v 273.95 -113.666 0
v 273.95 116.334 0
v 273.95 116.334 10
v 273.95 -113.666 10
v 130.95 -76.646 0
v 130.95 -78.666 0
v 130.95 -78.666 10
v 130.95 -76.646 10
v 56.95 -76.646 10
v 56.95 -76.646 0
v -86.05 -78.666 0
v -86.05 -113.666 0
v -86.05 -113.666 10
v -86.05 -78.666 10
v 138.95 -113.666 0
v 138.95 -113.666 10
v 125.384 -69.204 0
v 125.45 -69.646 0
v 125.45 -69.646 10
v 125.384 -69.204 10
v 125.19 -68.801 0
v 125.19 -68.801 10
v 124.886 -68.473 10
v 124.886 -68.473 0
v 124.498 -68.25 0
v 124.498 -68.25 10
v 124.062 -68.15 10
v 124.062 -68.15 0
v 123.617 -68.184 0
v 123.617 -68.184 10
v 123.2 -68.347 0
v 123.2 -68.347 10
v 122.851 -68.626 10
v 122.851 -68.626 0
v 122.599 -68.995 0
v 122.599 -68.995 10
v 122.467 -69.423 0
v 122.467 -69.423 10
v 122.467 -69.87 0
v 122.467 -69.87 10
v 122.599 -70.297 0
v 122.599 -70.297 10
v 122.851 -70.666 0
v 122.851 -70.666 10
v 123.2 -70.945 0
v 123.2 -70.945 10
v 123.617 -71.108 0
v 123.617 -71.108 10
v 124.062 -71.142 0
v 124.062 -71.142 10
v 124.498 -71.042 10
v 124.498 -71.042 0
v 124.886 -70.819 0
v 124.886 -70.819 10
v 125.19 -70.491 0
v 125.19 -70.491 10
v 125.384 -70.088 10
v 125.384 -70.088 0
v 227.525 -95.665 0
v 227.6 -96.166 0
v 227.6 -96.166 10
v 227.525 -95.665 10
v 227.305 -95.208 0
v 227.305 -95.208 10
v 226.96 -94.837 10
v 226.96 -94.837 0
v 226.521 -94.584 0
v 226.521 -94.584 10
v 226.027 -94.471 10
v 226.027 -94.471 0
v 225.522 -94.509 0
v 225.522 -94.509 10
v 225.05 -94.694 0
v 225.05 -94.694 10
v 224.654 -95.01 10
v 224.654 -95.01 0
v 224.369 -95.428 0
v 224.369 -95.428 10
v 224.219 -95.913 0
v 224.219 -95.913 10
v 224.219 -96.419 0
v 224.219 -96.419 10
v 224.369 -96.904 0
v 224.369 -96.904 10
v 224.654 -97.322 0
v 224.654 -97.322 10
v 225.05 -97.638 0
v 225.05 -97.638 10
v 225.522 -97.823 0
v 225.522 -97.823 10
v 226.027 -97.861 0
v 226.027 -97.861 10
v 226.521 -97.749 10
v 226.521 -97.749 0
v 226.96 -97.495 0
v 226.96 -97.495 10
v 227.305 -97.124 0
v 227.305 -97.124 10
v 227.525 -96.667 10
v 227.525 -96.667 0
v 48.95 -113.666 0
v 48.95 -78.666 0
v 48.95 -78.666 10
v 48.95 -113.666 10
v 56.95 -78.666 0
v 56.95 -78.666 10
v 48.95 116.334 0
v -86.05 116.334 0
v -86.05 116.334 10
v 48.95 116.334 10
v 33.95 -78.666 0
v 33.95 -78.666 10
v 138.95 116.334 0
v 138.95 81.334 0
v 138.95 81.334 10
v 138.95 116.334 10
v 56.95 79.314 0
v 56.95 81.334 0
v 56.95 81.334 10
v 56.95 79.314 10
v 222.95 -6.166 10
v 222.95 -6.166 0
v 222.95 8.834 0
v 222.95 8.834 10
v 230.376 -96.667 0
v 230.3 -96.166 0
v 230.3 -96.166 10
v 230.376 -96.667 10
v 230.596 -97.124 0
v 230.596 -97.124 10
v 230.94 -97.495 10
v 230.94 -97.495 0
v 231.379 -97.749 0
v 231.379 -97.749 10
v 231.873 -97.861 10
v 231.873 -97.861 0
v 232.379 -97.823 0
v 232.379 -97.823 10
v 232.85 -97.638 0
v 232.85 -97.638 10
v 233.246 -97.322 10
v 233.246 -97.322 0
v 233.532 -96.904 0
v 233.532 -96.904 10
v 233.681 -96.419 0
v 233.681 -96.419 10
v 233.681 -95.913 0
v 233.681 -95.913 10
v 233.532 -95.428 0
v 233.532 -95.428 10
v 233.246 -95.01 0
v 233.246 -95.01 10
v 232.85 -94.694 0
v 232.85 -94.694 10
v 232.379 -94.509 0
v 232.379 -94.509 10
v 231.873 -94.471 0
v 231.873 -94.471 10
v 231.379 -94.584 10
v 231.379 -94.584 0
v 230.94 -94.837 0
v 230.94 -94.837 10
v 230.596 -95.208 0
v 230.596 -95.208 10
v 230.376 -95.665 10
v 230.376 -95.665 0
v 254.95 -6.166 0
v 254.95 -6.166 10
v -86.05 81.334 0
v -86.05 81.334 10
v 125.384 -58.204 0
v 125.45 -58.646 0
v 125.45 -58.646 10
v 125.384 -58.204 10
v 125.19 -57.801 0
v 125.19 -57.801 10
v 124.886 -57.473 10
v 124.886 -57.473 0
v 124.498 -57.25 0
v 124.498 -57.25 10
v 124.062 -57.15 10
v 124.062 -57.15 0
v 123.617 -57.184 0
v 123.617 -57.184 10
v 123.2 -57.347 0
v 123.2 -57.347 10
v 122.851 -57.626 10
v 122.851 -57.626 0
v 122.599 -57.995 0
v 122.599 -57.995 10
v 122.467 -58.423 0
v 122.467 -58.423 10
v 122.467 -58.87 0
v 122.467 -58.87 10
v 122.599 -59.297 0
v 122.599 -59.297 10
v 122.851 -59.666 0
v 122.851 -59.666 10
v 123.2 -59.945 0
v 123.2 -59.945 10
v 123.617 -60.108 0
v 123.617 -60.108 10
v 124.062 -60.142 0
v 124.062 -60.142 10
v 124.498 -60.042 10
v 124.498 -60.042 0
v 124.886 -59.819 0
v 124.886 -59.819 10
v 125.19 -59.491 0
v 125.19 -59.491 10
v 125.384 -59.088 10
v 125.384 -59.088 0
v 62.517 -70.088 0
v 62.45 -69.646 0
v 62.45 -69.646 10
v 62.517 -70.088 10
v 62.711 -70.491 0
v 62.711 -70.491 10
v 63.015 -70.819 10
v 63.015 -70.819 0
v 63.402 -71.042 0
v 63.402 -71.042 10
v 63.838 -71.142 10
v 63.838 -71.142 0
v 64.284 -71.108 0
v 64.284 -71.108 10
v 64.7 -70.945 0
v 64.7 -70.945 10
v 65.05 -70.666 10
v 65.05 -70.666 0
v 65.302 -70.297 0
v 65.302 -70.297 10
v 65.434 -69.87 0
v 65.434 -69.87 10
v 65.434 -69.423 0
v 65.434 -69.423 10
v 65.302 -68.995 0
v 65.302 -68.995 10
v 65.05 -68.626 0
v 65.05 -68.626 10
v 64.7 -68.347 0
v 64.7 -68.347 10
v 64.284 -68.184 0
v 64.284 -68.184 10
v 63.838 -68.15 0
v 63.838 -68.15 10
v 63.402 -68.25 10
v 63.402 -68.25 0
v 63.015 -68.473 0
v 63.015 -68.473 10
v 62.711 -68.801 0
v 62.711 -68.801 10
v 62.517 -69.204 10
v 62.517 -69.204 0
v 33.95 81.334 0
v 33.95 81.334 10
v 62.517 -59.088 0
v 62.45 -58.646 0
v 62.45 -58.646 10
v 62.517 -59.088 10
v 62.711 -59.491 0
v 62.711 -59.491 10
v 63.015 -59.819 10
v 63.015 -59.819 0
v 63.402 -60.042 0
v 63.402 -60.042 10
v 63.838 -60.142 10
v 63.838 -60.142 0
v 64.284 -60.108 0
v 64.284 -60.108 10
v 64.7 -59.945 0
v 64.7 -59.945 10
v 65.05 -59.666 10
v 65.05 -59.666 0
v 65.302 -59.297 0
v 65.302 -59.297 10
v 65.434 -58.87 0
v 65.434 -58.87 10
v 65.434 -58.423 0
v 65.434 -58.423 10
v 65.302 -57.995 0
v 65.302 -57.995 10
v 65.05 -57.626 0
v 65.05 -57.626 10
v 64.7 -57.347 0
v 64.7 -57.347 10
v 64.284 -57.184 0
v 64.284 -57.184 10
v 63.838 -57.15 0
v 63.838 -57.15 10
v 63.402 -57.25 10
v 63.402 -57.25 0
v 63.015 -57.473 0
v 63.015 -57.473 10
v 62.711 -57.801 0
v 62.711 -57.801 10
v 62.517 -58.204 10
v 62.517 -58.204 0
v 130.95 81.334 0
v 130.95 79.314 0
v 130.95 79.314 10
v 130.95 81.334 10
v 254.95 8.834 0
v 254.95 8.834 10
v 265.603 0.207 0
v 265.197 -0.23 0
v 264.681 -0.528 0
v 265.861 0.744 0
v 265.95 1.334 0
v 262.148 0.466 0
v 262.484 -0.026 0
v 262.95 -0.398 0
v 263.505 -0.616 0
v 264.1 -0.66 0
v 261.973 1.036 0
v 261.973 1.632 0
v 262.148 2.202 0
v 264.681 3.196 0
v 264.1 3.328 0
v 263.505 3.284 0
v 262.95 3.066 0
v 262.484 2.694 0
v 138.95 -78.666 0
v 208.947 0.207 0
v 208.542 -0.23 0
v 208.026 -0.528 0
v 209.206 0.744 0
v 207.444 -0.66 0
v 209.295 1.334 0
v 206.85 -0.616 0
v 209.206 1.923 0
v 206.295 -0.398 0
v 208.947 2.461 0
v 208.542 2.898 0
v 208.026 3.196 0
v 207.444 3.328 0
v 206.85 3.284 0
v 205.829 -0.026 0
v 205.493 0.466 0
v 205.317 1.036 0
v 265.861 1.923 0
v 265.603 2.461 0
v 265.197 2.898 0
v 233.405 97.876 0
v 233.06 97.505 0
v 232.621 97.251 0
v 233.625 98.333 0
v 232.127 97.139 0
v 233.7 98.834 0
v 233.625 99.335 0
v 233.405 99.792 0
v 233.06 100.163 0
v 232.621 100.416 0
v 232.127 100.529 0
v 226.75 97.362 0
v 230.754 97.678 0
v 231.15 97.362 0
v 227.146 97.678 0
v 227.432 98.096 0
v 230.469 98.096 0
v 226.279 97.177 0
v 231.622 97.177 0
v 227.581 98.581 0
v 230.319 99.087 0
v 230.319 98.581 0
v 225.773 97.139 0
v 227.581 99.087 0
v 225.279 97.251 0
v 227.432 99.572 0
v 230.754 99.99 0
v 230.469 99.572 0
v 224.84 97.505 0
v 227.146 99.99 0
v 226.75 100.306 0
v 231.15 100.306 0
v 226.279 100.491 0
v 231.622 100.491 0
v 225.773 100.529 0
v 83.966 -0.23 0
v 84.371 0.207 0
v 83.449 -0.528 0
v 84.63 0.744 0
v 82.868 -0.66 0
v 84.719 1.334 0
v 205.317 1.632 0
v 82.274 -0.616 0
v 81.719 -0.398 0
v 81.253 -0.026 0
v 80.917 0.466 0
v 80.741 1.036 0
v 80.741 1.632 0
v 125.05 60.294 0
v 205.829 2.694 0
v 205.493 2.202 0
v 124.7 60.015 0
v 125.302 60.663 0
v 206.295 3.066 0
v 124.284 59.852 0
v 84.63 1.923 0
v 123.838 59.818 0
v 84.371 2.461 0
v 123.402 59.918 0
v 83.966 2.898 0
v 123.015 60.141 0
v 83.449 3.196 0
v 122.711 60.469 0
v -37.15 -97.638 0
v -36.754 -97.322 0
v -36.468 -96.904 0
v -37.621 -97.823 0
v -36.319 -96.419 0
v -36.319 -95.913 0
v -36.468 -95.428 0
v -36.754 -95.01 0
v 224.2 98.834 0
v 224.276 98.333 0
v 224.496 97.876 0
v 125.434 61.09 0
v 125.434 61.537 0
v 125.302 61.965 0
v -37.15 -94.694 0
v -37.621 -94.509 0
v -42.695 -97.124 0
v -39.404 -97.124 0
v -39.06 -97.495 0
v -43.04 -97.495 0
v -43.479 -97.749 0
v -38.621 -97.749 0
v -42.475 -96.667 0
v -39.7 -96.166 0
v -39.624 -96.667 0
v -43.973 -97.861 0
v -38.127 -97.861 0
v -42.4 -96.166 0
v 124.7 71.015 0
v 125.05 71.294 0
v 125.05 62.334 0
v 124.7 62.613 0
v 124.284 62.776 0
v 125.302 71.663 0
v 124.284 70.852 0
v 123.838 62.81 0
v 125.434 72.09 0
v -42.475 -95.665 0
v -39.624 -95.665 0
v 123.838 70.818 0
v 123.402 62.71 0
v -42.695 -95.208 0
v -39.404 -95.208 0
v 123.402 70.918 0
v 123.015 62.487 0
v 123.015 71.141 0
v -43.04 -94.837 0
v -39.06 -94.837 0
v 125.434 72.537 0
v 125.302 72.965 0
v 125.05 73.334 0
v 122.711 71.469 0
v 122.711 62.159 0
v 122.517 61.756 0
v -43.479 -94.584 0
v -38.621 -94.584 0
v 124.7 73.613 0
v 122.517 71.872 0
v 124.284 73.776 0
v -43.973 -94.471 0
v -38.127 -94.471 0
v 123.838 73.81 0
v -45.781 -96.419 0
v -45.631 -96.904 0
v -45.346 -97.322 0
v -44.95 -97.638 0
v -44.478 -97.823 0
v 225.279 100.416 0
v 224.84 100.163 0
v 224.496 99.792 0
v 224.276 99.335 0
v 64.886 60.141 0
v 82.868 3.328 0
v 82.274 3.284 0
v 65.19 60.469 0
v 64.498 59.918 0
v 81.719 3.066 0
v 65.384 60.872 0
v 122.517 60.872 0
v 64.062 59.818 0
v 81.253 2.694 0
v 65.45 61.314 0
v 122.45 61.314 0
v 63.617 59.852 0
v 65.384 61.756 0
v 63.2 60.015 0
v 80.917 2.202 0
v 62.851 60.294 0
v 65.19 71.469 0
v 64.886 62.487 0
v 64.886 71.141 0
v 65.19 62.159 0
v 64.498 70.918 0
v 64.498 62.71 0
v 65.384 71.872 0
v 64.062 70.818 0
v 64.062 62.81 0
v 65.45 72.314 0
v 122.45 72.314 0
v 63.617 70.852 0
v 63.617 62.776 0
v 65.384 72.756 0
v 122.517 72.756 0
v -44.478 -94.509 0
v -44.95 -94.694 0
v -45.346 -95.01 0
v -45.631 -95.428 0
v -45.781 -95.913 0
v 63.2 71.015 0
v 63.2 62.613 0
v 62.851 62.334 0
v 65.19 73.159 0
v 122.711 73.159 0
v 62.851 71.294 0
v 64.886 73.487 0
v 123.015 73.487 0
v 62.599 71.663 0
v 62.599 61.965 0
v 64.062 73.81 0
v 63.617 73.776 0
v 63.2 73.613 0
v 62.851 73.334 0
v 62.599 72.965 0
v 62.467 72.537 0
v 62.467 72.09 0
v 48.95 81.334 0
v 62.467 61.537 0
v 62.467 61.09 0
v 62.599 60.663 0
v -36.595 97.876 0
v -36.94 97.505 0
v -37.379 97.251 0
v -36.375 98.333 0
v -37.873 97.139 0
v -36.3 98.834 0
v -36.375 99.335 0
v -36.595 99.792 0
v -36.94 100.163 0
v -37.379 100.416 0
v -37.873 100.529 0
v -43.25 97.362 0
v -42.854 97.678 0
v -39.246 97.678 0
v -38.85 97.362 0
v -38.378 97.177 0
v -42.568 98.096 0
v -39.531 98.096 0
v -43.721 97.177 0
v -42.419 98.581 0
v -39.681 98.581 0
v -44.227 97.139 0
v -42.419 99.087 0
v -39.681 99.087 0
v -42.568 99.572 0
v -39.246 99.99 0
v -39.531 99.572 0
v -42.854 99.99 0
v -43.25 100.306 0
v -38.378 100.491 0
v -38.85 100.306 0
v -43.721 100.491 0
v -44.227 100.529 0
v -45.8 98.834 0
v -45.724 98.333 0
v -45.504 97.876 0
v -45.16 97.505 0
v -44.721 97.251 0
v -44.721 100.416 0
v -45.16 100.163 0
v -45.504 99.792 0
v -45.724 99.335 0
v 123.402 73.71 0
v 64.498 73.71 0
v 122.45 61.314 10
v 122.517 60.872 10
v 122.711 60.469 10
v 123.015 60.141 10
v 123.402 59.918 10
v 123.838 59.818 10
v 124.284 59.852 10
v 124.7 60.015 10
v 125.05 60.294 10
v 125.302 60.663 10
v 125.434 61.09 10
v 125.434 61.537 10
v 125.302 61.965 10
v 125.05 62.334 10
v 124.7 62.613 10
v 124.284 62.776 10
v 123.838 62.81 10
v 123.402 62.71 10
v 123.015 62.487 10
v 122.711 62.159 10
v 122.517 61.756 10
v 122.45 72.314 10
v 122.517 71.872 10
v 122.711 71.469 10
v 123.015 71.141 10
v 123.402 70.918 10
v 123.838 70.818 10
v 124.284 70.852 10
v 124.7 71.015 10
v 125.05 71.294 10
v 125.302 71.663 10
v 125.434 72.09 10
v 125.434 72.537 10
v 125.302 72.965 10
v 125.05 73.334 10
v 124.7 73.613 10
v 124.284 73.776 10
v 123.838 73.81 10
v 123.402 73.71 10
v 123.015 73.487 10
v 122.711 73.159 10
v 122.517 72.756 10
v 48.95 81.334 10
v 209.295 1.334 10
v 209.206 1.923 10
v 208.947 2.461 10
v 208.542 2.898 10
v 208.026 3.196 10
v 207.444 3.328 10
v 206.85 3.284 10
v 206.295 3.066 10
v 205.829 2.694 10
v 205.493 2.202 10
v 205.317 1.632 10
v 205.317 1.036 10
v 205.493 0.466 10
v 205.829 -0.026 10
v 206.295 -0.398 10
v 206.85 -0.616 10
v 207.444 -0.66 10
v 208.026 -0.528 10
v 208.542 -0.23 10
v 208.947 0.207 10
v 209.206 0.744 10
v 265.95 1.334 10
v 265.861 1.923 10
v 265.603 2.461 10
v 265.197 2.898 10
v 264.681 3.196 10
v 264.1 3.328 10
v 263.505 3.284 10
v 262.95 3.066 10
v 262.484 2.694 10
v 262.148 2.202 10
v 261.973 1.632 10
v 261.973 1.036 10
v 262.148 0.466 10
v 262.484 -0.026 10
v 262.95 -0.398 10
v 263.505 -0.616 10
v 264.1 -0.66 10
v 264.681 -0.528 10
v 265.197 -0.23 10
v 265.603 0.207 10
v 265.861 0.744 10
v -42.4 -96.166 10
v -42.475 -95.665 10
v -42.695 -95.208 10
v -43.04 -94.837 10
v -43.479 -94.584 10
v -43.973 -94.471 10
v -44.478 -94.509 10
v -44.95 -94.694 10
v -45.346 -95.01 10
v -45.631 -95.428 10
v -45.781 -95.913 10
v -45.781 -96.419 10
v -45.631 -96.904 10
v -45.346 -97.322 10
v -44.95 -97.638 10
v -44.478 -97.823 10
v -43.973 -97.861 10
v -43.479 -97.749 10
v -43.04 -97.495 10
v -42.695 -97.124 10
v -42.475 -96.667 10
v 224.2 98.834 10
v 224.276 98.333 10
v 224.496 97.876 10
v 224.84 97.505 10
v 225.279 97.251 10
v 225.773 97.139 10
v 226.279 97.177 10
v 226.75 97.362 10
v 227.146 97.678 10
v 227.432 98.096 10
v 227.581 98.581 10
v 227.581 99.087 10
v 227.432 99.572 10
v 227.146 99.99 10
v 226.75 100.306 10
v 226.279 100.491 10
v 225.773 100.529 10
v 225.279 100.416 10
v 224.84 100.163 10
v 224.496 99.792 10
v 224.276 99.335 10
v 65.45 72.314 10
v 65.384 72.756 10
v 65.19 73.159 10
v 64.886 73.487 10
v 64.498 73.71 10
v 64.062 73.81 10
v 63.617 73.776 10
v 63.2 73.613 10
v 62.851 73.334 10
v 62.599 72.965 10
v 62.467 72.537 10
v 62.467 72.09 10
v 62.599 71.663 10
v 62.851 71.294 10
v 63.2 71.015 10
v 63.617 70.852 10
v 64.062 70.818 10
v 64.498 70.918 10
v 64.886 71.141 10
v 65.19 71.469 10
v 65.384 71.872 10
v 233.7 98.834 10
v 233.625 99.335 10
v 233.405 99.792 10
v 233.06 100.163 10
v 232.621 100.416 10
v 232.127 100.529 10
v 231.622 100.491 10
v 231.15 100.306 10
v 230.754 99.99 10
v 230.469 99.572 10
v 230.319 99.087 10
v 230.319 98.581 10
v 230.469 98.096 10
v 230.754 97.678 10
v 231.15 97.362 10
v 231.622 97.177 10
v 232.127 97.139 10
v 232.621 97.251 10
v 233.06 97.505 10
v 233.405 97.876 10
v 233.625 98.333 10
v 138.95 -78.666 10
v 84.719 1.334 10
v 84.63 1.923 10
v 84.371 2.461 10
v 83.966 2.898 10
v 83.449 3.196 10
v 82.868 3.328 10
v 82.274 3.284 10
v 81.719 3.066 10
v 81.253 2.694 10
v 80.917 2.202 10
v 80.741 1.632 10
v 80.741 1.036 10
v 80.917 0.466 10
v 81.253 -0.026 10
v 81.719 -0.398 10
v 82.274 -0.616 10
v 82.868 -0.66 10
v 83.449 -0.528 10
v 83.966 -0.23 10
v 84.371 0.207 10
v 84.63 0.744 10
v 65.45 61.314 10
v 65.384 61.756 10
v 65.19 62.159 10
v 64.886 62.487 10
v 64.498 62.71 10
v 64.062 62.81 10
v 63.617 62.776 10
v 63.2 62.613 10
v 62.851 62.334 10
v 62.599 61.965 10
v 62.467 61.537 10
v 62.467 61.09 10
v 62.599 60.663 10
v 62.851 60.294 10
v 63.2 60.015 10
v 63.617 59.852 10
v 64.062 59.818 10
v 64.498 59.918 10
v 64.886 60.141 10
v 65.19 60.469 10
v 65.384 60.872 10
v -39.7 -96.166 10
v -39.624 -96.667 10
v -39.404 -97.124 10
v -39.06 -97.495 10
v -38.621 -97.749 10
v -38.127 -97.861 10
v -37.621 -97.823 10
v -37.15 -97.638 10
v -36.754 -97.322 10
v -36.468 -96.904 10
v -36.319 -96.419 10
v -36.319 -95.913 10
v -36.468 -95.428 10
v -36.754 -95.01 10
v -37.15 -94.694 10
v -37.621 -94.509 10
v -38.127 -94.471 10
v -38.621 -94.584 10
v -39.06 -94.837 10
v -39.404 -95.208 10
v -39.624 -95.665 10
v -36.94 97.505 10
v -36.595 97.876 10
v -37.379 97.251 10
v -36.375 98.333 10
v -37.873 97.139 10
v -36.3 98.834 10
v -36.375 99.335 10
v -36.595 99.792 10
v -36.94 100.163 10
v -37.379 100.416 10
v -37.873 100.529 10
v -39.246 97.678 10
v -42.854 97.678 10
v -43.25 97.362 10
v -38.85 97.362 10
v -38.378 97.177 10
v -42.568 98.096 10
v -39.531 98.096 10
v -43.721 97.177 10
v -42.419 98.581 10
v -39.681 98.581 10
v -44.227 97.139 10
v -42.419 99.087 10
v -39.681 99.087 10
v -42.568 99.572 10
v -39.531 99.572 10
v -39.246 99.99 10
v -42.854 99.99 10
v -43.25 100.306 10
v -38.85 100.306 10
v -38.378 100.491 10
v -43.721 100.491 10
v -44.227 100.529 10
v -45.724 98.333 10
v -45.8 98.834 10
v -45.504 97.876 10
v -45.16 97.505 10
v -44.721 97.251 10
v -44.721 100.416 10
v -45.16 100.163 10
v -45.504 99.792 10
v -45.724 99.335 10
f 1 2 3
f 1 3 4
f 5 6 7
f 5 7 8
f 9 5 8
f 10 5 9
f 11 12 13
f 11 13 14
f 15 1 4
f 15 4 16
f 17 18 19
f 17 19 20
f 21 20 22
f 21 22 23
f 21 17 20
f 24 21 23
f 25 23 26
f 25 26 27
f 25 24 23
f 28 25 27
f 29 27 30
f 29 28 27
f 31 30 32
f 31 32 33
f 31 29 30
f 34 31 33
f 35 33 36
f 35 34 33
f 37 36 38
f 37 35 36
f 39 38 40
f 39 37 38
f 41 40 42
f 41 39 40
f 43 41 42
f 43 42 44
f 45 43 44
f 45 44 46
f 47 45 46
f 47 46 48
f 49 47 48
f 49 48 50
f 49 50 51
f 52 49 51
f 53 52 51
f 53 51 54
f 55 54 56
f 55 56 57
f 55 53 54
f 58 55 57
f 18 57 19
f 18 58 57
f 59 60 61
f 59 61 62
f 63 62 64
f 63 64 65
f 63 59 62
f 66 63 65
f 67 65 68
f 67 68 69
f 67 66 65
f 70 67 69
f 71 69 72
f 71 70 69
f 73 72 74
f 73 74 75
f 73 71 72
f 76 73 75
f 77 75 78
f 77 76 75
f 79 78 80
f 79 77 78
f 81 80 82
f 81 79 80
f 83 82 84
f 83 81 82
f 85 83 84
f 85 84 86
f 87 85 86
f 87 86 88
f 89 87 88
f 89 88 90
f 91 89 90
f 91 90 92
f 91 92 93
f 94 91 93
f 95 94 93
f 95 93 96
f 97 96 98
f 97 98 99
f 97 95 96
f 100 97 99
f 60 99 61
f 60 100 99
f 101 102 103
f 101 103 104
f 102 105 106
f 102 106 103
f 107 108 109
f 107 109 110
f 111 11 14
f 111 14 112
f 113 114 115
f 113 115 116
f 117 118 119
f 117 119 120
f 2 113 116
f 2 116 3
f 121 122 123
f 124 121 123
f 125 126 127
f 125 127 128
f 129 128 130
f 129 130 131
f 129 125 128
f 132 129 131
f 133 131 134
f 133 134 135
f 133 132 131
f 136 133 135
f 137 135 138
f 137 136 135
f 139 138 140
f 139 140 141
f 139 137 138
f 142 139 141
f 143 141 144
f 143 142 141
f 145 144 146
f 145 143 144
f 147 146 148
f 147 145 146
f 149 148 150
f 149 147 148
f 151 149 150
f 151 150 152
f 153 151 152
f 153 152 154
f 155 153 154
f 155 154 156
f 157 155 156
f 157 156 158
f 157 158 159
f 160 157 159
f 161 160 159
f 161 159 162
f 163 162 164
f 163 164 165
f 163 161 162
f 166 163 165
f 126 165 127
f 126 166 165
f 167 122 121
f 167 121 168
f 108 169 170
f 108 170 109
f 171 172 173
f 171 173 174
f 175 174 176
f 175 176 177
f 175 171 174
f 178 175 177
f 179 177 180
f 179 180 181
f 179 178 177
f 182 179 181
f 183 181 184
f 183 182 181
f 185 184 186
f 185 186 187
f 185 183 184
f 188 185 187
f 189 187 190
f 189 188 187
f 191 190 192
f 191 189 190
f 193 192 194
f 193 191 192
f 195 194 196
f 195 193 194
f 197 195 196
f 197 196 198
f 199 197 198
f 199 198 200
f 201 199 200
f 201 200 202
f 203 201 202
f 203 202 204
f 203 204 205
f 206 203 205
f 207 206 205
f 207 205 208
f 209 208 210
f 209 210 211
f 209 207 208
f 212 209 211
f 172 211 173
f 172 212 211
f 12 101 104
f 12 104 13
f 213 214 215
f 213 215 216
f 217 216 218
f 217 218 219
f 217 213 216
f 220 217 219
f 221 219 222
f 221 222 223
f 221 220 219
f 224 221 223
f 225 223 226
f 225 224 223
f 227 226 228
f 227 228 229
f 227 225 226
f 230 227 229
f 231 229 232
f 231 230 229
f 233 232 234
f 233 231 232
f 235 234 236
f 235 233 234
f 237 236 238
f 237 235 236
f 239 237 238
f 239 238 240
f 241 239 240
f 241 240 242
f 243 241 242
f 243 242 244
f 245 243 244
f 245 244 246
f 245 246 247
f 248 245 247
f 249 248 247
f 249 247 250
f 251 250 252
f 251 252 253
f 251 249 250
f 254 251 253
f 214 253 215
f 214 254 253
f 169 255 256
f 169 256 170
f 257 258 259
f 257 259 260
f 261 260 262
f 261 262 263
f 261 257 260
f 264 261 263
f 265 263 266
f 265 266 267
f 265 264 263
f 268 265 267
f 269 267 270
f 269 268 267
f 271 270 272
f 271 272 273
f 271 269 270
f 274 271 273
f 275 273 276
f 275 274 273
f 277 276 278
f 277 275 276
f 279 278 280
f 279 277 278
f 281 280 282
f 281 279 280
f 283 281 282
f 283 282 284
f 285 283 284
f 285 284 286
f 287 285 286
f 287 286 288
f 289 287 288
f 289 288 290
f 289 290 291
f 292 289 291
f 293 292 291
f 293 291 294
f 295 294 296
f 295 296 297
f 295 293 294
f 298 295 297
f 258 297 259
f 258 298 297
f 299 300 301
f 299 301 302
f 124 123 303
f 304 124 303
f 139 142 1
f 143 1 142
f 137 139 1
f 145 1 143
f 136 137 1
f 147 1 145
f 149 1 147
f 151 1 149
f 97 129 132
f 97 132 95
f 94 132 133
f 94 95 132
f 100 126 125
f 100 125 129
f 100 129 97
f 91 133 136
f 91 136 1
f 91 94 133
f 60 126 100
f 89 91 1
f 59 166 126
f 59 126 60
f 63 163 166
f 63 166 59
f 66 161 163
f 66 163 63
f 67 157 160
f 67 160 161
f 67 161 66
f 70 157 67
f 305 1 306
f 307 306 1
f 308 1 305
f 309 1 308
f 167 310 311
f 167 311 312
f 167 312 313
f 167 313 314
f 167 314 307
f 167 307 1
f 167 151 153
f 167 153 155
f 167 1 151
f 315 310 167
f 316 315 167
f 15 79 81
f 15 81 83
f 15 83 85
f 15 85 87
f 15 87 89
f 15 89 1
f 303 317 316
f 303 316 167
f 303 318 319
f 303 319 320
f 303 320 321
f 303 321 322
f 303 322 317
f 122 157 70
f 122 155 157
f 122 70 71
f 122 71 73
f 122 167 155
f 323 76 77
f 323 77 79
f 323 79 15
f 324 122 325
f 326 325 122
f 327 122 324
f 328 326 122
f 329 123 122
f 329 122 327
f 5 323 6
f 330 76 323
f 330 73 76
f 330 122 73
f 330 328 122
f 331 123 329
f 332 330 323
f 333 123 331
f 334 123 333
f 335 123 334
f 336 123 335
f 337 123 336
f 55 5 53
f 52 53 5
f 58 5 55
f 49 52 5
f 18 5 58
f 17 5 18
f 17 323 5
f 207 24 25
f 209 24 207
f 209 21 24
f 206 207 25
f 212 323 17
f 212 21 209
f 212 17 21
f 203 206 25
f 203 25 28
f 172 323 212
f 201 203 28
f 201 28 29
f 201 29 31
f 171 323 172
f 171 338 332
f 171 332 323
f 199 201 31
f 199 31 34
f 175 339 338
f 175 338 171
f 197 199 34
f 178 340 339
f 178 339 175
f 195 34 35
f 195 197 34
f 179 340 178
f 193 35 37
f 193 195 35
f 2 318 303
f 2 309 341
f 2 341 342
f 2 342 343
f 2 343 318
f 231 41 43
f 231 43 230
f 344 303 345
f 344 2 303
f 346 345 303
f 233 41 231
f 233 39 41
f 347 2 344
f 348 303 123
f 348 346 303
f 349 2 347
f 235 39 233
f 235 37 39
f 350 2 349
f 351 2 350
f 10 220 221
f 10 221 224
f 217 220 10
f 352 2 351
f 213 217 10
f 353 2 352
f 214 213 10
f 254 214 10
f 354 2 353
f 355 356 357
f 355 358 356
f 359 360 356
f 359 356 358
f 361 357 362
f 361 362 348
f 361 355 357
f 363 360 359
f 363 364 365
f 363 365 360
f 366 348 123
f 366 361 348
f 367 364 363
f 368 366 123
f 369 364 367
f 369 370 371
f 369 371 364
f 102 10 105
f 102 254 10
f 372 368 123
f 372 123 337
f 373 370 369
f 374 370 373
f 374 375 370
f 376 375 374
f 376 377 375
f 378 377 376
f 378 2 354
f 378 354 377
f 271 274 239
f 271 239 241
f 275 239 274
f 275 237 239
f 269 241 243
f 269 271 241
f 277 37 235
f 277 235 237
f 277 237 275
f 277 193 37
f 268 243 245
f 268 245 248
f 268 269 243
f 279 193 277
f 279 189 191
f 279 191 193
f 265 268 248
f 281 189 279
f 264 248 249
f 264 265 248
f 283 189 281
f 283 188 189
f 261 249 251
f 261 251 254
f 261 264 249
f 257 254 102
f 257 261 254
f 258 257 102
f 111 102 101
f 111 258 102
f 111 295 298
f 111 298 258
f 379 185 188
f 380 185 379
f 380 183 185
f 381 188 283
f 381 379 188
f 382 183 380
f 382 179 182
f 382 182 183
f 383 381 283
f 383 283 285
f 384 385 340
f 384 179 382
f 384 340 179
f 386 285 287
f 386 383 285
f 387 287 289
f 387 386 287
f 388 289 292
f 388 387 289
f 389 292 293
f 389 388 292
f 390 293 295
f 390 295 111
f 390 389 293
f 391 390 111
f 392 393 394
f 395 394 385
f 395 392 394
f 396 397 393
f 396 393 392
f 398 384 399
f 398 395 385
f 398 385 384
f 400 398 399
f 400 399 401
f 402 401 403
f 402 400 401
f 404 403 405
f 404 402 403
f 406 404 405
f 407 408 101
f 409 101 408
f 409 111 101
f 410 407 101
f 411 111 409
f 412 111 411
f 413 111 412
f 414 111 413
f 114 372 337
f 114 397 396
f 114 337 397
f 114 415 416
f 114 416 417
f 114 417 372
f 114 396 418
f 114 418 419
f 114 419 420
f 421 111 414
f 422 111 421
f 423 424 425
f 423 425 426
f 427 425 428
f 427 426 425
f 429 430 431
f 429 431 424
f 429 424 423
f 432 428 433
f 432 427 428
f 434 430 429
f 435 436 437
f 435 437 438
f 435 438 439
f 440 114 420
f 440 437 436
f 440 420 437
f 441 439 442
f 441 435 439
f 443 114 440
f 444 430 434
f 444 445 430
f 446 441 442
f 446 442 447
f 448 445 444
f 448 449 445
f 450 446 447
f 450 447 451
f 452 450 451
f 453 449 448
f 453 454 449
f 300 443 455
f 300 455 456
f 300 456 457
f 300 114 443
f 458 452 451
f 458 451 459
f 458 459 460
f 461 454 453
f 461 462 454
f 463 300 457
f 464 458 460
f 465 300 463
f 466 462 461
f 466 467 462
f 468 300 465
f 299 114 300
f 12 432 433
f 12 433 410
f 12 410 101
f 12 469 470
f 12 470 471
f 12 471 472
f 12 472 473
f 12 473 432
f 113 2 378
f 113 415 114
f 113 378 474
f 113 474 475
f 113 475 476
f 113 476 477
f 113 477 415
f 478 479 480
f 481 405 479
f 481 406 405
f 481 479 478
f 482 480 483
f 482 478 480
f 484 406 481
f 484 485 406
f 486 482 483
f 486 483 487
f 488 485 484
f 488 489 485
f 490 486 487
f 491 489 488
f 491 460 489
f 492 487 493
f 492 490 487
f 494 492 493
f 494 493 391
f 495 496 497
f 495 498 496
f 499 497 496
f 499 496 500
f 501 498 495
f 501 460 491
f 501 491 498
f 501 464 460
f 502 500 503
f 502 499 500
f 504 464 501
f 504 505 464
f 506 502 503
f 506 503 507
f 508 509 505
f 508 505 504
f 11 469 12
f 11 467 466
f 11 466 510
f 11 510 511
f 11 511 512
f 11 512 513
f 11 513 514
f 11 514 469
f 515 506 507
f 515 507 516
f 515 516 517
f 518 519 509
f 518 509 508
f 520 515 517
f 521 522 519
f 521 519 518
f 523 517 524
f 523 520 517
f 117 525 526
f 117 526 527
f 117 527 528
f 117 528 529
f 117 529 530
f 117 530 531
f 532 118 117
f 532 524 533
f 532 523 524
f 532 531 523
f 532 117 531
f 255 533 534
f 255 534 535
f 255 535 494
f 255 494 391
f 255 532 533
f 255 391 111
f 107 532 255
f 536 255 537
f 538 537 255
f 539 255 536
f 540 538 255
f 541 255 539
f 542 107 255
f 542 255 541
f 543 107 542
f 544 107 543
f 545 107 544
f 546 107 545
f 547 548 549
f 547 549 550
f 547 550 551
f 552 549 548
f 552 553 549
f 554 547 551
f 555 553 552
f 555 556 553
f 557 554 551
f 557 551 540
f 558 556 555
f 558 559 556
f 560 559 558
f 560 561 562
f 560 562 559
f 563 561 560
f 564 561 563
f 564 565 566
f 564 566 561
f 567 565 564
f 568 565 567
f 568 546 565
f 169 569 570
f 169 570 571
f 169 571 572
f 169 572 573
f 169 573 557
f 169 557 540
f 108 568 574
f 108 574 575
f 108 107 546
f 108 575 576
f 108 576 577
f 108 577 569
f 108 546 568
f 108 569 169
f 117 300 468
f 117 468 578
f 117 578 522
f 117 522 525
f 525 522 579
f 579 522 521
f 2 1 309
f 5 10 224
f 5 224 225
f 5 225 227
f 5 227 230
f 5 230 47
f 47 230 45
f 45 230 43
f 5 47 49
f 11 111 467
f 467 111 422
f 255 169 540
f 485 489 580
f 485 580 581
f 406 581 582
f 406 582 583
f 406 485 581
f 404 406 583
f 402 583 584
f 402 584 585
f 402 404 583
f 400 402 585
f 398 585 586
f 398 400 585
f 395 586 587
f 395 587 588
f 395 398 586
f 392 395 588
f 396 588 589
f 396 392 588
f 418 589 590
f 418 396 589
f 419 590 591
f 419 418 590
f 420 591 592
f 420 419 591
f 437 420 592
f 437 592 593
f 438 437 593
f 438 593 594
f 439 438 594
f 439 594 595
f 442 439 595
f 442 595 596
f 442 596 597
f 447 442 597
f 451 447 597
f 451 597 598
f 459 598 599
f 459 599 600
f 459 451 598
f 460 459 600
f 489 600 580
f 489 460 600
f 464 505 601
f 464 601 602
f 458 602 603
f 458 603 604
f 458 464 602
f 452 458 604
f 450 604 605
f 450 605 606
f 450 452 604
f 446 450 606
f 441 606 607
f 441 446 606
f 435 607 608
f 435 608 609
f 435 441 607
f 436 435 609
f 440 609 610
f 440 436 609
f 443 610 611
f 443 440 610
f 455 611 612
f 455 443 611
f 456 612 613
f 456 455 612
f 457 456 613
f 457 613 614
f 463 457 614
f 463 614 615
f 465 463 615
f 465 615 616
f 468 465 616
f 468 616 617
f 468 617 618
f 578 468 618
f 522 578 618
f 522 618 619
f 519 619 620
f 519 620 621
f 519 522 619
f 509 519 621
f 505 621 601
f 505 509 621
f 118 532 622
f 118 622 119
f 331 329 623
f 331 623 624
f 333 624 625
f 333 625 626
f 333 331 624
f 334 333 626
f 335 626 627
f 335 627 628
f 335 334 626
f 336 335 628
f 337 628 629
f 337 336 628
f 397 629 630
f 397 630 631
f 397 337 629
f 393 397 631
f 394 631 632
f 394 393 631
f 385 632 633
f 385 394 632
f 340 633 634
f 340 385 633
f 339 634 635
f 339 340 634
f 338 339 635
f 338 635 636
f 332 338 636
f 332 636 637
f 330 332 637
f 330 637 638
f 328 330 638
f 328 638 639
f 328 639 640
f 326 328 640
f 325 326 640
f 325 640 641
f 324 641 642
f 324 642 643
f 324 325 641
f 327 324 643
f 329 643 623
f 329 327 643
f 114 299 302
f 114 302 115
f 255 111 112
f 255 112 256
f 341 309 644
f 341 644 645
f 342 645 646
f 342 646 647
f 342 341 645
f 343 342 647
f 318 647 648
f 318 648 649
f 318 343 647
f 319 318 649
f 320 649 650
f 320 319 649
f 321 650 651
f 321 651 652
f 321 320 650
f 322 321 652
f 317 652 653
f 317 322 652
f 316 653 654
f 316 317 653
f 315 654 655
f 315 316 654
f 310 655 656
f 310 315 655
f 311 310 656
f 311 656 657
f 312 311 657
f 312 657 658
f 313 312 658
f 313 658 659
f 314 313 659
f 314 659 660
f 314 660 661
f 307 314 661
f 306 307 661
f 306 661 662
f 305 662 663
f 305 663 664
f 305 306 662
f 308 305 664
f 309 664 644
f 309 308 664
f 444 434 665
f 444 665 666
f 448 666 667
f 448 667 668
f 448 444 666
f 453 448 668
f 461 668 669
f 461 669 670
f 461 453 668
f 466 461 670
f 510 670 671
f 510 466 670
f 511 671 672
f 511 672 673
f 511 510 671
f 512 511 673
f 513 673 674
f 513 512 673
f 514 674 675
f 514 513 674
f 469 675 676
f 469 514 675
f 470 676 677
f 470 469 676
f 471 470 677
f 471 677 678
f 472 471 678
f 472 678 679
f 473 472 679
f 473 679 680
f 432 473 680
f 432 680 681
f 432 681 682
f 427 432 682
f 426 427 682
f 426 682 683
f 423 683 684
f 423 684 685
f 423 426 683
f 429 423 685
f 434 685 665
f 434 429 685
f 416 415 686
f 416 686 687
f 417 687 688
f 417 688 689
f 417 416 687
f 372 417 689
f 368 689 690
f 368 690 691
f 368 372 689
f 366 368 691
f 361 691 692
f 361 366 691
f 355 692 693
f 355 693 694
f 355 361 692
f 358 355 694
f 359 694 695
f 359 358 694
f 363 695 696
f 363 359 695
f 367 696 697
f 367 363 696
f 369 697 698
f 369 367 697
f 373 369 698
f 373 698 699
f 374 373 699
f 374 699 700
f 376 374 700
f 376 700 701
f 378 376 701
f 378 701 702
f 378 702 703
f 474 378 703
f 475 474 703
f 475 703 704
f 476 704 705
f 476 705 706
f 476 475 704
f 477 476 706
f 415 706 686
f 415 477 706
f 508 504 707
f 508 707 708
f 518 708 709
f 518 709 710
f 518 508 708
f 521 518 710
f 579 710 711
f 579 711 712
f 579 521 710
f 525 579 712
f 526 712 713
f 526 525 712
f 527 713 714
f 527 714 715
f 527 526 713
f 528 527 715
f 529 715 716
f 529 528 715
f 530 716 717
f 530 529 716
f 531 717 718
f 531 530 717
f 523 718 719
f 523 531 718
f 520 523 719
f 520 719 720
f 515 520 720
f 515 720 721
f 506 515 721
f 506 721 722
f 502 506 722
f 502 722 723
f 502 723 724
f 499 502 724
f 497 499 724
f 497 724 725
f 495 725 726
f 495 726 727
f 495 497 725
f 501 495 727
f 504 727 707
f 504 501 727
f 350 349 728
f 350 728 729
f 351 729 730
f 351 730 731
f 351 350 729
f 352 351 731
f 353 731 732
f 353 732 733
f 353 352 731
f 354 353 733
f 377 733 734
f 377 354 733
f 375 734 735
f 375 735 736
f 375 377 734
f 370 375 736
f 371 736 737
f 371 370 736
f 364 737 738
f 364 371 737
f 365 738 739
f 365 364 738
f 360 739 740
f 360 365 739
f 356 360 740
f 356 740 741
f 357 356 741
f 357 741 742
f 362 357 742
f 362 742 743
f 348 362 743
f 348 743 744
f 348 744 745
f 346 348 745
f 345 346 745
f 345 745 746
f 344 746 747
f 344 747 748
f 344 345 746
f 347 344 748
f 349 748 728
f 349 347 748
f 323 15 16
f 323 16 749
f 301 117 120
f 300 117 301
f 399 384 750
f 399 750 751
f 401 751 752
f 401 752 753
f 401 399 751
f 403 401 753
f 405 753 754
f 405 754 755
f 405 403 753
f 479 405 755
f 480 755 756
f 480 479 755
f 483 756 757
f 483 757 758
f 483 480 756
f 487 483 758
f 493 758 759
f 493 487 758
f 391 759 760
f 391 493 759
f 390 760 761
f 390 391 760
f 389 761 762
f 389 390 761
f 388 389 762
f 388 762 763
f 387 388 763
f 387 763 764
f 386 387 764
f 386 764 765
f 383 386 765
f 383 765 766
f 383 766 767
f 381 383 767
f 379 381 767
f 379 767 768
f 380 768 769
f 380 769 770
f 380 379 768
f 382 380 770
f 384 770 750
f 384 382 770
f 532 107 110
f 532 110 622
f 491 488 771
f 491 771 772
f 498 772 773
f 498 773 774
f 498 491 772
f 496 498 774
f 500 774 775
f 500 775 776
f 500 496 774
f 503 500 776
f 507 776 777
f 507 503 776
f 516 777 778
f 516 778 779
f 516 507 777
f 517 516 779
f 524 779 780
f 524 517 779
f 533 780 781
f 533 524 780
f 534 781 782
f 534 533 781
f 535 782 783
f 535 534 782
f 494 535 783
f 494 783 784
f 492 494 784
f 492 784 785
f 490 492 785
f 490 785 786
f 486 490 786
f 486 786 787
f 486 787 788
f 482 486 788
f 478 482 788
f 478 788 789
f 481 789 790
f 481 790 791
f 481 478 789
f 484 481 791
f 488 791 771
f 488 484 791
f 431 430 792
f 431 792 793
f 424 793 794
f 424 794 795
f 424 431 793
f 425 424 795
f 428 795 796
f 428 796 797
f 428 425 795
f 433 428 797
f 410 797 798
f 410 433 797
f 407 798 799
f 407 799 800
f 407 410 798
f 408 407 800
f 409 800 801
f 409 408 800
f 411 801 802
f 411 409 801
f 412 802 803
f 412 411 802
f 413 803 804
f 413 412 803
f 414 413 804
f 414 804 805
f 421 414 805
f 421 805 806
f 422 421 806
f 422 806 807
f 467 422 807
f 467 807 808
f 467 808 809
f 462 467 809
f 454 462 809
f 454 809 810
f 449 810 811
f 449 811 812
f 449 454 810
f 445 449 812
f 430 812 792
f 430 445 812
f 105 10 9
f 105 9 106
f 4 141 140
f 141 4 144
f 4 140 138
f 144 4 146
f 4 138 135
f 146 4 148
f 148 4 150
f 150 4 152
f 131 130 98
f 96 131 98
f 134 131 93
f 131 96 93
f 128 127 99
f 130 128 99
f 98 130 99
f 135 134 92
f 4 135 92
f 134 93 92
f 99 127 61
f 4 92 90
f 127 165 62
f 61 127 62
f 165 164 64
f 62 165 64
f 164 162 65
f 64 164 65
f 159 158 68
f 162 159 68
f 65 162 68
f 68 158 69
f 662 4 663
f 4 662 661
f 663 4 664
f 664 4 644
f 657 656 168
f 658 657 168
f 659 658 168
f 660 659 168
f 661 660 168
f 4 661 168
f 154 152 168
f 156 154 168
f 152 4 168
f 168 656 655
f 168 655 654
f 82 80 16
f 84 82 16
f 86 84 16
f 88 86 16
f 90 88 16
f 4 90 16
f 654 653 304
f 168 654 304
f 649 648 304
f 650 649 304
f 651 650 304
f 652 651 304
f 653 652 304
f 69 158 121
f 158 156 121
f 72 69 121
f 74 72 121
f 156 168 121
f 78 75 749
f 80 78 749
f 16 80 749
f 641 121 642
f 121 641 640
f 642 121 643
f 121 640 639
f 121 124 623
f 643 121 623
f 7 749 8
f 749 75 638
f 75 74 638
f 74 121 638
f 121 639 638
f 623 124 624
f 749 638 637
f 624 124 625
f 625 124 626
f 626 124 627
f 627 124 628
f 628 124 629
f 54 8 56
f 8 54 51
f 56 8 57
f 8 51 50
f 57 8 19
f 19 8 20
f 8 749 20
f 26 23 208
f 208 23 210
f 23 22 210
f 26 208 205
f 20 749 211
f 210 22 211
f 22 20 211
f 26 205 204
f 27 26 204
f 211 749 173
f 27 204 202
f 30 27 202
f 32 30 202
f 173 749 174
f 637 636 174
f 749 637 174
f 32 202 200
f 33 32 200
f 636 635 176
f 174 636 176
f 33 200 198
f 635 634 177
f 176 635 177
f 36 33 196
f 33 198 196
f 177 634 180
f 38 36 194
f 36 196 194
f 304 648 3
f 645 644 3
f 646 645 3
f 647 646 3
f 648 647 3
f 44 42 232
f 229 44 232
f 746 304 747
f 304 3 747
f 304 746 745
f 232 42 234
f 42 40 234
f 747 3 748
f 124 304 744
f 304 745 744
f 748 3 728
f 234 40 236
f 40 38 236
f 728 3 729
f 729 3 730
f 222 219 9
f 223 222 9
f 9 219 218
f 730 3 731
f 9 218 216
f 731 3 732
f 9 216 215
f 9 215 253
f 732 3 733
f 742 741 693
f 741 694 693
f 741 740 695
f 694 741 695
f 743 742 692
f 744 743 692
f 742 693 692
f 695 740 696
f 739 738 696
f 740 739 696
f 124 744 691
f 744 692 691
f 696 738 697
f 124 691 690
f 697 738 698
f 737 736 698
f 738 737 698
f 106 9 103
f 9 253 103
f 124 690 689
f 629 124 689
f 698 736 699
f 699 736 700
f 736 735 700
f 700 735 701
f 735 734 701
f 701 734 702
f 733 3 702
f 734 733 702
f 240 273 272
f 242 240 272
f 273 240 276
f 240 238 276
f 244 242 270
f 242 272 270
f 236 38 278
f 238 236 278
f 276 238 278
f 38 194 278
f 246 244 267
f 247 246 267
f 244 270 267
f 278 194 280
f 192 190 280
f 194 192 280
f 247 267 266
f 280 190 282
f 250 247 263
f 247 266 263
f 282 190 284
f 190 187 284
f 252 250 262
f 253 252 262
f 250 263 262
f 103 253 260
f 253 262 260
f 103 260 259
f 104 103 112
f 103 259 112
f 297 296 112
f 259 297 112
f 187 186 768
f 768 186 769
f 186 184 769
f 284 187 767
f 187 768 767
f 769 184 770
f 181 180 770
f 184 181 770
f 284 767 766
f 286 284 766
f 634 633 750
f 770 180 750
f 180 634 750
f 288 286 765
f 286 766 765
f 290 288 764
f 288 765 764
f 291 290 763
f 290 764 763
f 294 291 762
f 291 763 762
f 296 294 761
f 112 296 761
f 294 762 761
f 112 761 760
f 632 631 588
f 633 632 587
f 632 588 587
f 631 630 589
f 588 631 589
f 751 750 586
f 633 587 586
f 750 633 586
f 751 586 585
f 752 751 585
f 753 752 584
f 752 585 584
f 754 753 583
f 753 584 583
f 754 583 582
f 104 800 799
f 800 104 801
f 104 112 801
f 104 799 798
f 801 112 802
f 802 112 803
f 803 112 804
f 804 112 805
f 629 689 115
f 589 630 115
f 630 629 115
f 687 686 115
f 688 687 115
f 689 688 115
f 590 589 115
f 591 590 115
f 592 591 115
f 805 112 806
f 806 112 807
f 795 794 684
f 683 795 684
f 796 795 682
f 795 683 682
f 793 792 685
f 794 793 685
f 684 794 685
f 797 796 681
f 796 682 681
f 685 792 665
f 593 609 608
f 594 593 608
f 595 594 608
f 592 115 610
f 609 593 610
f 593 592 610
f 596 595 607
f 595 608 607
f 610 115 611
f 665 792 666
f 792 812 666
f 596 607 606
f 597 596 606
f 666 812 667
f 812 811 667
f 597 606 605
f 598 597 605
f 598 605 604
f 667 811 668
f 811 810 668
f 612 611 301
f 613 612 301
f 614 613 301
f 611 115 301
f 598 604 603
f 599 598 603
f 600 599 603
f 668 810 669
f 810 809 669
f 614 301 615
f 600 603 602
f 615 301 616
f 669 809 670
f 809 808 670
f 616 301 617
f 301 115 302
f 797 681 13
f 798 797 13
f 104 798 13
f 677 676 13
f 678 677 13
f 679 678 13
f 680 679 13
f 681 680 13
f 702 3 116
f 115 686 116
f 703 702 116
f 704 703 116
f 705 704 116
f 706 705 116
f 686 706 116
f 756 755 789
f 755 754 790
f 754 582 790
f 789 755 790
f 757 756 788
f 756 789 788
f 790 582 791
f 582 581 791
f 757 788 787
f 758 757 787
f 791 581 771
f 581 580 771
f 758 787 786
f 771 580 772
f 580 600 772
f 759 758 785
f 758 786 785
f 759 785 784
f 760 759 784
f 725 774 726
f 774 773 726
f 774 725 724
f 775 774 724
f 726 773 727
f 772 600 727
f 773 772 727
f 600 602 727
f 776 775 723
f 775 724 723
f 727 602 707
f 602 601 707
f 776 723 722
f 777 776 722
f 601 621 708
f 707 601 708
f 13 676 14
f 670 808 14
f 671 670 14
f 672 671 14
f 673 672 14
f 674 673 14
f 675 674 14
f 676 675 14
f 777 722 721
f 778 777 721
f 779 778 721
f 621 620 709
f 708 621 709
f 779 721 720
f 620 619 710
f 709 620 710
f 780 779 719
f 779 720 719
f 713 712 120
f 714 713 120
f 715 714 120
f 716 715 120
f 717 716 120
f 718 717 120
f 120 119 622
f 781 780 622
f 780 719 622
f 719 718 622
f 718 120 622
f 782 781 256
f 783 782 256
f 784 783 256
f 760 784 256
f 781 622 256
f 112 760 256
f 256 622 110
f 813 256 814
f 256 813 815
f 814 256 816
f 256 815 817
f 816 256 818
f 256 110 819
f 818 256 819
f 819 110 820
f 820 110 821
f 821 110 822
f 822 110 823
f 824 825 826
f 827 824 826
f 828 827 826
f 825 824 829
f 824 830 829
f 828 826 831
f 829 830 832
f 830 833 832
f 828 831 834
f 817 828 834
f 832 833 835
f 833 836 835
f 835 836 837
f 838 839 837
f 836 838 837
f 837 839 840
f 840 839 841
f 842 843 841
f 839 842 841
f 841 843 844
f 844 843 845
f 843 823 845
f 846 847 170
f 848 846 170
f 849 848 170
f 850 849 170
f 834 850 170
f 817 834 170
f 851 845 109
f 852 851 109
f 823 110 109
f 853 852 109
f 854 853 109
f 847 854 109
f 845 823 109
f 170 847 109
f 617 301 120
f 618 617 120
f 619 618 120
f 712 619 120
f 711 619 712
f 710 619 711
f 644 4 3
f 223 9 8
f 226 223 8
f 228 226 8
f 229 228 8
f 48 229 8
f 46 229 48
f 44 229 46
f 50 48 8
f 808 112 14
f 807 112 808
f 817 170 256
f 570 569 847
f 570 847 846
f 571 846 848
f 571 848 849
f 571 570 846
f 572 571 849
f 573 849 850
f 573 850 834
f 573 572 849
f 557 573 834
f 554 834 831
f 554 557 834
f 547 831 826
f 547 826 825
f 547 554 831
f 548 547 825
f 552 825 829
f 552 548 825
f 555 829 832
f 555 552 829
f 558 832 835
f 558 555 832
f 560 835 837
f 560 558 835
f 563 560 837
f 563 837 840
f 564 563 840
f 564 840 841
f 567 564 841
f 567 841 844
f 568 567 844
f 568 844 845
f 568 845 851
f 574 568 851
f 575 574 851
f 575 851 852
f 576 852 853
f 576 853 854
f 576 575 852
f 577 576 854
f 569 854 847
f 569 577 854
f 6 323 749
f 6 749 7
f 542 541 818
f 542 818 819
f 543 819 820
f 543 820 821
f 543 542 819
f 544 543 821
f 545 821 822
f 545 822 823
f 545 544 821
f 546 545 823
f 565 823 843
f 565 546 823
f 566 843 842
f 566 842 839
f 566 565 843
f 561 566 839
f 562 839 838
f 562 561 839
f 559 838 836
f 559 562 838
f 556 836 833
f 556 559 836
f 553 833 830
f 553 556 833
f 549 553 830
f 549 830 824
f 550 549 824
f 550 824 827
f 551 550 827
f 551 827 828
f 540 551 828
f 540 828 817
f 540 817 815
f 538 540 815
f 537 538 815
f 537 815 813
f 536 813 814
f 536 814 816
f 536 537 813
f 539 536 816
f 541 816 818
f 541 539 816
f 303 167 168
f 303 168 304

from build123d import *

# Parameters (mm, degrees)
SKETCH1_R           = 1.5
SKETCH1_R_2         = 1.7
SKETCH1_R_3         = 2
SKETCH1_W           = 32
SKETCH1_H           = 15
BOSS_EXTRUDE1_DEPTH = 10


with BuildPart() as part:
    # Sketch1 → Boss-Extrude1 (new body)
    with BuildSketch(Plane.XY):
        Polygon((-86.049704166, 116.333921241), (48.950295834, 116.333921241), (48.950295834, 81.333921241), (56.950295834, 81.333921241), (56.950295834, 79.313921241), (130.950295834, 79.313921241), (130.950295834, 81.333921241), (138.950295834, 81.333921241), (138.950295834, 116.333921241), (273.950295834, 116.333921241), (273.950295834, -113.666078759), (138.950295834, -113.666078759), (138.950295834, -78.666078759), (130.950295834, -78.666078759), (130.950295834, -76.646078759), (56.950295834, -76.646078759), (56.950295834, -78.666078759), (48.950295834, -78.666078759), (48.950295834, -113.666078759), (-86.049704166, -113.666078759), (-86.049704166, -78.666078759), (33.950295834, -78.666078759), (33.950295834, 81.333921241), (-86.049704166, 81.333921241), align=None)
        with Locations((63.950295834, 72.313921241)):
            Circle(SKETCH1_R, mode=Mode.SUBTRACT)
        with Locations((63.950295834, 61.313921241)):
            Circle(SKETCH1_R, mode=Mode.SUBTRACT)
        with Locations(Location((123.950295834, 72.313921241, 0), (0, 0, 180))):
            Circle(SKETCH1_R, mode=Mode.SUBTRACT)
        with Locations(Location((123.950295834, 61.313921241, 0), (0, 0, 180))):
            Circle(SKETCH1_R, mode=Mode.SUBTRACT)
        with Locations(Location((63.950295834, -69.646078759, 0), (0, 0, 180))):
            Circle(SKETCH1_R, mode=Mode.SUBTRACT)
        with Locations(Location((63.950295834, -58.646078759, 0), (0, 0, 180))):
            Circle(SKETCH1_R, mode=Mode.SUBTRACT)
        with Locations((123.950295834, -69.646078759)):
            Circle(SKETCH1_R, mode=Mode.SUBTRACT)
        with Locations((123.950295834, -58.646078759)):
            Circle(SKETCH1_R, mode=Mode.SUBTRACT)
        with Locations((-44.099704166, -96.166078759)):
            Circle(SKETCH1_R_2, mode=Mode.SUBTRACT)
        with Locations(Location((-37.999704166, -96.166078759, 0), (0, 0, 180))):
            Circle(SKETCH1_R_2, mode=Mode.SUBTRACT)
        with Locations(Location((-44.099704166, 98.833921241, 0), (0, 0, 180))):
            Circle(SKETCH1_R_2, mode=Mode.SUBTRACT)
        with Locations((-37.999704166, 98.833921241)):
            Circle(SKETCH1_R_2, mode=Mode.SUBTRACT)
        with Locations(Location((232.000295834, -96.166078759, 0), (0, 0, 180))):
            Circle(SKETCH1_R_2, mode=Mode.SUBTRACT)
        with Locations((225.900295834, -96.166078759)):
            Circle(SKETCH1_R_2, mode=Mode.SUBTRACT)
        with Locations(Location((225.900295834, 98.833921241, 0), (0, 0, 180))):
            Circle(SKETCH1_R_2, mode=Mode.SUBTRACT)
        with Locations((232.000295834, 98.833921241)):
            Circle(SKETCH1_R_2, mode=Mode.SUBTRACT)
        with Locations((82.718725704, 1.333921241)):
            Circle(SKETCH1_R_3, mode=Mode.SUBTRACT)
        with Locations((207.29497673, 1.333921241)):
            Circle(SKETCH1_R_3, mode=Mode.SUBTRACT)
        with Locations((263.950295834, 1.333921241)):
            Circle(SKETCH1_R_3, mode=Mode.SUBTRACT)
        with Locations((238.950295834, 1.333921241)):
            Rectangle(SKETCH1_W, SKETCH1_H, mode=Mode.SUBTRACT)
    extrude(amount=BOSS_EXTRUDE1_DEPTH)


solid = part.part
